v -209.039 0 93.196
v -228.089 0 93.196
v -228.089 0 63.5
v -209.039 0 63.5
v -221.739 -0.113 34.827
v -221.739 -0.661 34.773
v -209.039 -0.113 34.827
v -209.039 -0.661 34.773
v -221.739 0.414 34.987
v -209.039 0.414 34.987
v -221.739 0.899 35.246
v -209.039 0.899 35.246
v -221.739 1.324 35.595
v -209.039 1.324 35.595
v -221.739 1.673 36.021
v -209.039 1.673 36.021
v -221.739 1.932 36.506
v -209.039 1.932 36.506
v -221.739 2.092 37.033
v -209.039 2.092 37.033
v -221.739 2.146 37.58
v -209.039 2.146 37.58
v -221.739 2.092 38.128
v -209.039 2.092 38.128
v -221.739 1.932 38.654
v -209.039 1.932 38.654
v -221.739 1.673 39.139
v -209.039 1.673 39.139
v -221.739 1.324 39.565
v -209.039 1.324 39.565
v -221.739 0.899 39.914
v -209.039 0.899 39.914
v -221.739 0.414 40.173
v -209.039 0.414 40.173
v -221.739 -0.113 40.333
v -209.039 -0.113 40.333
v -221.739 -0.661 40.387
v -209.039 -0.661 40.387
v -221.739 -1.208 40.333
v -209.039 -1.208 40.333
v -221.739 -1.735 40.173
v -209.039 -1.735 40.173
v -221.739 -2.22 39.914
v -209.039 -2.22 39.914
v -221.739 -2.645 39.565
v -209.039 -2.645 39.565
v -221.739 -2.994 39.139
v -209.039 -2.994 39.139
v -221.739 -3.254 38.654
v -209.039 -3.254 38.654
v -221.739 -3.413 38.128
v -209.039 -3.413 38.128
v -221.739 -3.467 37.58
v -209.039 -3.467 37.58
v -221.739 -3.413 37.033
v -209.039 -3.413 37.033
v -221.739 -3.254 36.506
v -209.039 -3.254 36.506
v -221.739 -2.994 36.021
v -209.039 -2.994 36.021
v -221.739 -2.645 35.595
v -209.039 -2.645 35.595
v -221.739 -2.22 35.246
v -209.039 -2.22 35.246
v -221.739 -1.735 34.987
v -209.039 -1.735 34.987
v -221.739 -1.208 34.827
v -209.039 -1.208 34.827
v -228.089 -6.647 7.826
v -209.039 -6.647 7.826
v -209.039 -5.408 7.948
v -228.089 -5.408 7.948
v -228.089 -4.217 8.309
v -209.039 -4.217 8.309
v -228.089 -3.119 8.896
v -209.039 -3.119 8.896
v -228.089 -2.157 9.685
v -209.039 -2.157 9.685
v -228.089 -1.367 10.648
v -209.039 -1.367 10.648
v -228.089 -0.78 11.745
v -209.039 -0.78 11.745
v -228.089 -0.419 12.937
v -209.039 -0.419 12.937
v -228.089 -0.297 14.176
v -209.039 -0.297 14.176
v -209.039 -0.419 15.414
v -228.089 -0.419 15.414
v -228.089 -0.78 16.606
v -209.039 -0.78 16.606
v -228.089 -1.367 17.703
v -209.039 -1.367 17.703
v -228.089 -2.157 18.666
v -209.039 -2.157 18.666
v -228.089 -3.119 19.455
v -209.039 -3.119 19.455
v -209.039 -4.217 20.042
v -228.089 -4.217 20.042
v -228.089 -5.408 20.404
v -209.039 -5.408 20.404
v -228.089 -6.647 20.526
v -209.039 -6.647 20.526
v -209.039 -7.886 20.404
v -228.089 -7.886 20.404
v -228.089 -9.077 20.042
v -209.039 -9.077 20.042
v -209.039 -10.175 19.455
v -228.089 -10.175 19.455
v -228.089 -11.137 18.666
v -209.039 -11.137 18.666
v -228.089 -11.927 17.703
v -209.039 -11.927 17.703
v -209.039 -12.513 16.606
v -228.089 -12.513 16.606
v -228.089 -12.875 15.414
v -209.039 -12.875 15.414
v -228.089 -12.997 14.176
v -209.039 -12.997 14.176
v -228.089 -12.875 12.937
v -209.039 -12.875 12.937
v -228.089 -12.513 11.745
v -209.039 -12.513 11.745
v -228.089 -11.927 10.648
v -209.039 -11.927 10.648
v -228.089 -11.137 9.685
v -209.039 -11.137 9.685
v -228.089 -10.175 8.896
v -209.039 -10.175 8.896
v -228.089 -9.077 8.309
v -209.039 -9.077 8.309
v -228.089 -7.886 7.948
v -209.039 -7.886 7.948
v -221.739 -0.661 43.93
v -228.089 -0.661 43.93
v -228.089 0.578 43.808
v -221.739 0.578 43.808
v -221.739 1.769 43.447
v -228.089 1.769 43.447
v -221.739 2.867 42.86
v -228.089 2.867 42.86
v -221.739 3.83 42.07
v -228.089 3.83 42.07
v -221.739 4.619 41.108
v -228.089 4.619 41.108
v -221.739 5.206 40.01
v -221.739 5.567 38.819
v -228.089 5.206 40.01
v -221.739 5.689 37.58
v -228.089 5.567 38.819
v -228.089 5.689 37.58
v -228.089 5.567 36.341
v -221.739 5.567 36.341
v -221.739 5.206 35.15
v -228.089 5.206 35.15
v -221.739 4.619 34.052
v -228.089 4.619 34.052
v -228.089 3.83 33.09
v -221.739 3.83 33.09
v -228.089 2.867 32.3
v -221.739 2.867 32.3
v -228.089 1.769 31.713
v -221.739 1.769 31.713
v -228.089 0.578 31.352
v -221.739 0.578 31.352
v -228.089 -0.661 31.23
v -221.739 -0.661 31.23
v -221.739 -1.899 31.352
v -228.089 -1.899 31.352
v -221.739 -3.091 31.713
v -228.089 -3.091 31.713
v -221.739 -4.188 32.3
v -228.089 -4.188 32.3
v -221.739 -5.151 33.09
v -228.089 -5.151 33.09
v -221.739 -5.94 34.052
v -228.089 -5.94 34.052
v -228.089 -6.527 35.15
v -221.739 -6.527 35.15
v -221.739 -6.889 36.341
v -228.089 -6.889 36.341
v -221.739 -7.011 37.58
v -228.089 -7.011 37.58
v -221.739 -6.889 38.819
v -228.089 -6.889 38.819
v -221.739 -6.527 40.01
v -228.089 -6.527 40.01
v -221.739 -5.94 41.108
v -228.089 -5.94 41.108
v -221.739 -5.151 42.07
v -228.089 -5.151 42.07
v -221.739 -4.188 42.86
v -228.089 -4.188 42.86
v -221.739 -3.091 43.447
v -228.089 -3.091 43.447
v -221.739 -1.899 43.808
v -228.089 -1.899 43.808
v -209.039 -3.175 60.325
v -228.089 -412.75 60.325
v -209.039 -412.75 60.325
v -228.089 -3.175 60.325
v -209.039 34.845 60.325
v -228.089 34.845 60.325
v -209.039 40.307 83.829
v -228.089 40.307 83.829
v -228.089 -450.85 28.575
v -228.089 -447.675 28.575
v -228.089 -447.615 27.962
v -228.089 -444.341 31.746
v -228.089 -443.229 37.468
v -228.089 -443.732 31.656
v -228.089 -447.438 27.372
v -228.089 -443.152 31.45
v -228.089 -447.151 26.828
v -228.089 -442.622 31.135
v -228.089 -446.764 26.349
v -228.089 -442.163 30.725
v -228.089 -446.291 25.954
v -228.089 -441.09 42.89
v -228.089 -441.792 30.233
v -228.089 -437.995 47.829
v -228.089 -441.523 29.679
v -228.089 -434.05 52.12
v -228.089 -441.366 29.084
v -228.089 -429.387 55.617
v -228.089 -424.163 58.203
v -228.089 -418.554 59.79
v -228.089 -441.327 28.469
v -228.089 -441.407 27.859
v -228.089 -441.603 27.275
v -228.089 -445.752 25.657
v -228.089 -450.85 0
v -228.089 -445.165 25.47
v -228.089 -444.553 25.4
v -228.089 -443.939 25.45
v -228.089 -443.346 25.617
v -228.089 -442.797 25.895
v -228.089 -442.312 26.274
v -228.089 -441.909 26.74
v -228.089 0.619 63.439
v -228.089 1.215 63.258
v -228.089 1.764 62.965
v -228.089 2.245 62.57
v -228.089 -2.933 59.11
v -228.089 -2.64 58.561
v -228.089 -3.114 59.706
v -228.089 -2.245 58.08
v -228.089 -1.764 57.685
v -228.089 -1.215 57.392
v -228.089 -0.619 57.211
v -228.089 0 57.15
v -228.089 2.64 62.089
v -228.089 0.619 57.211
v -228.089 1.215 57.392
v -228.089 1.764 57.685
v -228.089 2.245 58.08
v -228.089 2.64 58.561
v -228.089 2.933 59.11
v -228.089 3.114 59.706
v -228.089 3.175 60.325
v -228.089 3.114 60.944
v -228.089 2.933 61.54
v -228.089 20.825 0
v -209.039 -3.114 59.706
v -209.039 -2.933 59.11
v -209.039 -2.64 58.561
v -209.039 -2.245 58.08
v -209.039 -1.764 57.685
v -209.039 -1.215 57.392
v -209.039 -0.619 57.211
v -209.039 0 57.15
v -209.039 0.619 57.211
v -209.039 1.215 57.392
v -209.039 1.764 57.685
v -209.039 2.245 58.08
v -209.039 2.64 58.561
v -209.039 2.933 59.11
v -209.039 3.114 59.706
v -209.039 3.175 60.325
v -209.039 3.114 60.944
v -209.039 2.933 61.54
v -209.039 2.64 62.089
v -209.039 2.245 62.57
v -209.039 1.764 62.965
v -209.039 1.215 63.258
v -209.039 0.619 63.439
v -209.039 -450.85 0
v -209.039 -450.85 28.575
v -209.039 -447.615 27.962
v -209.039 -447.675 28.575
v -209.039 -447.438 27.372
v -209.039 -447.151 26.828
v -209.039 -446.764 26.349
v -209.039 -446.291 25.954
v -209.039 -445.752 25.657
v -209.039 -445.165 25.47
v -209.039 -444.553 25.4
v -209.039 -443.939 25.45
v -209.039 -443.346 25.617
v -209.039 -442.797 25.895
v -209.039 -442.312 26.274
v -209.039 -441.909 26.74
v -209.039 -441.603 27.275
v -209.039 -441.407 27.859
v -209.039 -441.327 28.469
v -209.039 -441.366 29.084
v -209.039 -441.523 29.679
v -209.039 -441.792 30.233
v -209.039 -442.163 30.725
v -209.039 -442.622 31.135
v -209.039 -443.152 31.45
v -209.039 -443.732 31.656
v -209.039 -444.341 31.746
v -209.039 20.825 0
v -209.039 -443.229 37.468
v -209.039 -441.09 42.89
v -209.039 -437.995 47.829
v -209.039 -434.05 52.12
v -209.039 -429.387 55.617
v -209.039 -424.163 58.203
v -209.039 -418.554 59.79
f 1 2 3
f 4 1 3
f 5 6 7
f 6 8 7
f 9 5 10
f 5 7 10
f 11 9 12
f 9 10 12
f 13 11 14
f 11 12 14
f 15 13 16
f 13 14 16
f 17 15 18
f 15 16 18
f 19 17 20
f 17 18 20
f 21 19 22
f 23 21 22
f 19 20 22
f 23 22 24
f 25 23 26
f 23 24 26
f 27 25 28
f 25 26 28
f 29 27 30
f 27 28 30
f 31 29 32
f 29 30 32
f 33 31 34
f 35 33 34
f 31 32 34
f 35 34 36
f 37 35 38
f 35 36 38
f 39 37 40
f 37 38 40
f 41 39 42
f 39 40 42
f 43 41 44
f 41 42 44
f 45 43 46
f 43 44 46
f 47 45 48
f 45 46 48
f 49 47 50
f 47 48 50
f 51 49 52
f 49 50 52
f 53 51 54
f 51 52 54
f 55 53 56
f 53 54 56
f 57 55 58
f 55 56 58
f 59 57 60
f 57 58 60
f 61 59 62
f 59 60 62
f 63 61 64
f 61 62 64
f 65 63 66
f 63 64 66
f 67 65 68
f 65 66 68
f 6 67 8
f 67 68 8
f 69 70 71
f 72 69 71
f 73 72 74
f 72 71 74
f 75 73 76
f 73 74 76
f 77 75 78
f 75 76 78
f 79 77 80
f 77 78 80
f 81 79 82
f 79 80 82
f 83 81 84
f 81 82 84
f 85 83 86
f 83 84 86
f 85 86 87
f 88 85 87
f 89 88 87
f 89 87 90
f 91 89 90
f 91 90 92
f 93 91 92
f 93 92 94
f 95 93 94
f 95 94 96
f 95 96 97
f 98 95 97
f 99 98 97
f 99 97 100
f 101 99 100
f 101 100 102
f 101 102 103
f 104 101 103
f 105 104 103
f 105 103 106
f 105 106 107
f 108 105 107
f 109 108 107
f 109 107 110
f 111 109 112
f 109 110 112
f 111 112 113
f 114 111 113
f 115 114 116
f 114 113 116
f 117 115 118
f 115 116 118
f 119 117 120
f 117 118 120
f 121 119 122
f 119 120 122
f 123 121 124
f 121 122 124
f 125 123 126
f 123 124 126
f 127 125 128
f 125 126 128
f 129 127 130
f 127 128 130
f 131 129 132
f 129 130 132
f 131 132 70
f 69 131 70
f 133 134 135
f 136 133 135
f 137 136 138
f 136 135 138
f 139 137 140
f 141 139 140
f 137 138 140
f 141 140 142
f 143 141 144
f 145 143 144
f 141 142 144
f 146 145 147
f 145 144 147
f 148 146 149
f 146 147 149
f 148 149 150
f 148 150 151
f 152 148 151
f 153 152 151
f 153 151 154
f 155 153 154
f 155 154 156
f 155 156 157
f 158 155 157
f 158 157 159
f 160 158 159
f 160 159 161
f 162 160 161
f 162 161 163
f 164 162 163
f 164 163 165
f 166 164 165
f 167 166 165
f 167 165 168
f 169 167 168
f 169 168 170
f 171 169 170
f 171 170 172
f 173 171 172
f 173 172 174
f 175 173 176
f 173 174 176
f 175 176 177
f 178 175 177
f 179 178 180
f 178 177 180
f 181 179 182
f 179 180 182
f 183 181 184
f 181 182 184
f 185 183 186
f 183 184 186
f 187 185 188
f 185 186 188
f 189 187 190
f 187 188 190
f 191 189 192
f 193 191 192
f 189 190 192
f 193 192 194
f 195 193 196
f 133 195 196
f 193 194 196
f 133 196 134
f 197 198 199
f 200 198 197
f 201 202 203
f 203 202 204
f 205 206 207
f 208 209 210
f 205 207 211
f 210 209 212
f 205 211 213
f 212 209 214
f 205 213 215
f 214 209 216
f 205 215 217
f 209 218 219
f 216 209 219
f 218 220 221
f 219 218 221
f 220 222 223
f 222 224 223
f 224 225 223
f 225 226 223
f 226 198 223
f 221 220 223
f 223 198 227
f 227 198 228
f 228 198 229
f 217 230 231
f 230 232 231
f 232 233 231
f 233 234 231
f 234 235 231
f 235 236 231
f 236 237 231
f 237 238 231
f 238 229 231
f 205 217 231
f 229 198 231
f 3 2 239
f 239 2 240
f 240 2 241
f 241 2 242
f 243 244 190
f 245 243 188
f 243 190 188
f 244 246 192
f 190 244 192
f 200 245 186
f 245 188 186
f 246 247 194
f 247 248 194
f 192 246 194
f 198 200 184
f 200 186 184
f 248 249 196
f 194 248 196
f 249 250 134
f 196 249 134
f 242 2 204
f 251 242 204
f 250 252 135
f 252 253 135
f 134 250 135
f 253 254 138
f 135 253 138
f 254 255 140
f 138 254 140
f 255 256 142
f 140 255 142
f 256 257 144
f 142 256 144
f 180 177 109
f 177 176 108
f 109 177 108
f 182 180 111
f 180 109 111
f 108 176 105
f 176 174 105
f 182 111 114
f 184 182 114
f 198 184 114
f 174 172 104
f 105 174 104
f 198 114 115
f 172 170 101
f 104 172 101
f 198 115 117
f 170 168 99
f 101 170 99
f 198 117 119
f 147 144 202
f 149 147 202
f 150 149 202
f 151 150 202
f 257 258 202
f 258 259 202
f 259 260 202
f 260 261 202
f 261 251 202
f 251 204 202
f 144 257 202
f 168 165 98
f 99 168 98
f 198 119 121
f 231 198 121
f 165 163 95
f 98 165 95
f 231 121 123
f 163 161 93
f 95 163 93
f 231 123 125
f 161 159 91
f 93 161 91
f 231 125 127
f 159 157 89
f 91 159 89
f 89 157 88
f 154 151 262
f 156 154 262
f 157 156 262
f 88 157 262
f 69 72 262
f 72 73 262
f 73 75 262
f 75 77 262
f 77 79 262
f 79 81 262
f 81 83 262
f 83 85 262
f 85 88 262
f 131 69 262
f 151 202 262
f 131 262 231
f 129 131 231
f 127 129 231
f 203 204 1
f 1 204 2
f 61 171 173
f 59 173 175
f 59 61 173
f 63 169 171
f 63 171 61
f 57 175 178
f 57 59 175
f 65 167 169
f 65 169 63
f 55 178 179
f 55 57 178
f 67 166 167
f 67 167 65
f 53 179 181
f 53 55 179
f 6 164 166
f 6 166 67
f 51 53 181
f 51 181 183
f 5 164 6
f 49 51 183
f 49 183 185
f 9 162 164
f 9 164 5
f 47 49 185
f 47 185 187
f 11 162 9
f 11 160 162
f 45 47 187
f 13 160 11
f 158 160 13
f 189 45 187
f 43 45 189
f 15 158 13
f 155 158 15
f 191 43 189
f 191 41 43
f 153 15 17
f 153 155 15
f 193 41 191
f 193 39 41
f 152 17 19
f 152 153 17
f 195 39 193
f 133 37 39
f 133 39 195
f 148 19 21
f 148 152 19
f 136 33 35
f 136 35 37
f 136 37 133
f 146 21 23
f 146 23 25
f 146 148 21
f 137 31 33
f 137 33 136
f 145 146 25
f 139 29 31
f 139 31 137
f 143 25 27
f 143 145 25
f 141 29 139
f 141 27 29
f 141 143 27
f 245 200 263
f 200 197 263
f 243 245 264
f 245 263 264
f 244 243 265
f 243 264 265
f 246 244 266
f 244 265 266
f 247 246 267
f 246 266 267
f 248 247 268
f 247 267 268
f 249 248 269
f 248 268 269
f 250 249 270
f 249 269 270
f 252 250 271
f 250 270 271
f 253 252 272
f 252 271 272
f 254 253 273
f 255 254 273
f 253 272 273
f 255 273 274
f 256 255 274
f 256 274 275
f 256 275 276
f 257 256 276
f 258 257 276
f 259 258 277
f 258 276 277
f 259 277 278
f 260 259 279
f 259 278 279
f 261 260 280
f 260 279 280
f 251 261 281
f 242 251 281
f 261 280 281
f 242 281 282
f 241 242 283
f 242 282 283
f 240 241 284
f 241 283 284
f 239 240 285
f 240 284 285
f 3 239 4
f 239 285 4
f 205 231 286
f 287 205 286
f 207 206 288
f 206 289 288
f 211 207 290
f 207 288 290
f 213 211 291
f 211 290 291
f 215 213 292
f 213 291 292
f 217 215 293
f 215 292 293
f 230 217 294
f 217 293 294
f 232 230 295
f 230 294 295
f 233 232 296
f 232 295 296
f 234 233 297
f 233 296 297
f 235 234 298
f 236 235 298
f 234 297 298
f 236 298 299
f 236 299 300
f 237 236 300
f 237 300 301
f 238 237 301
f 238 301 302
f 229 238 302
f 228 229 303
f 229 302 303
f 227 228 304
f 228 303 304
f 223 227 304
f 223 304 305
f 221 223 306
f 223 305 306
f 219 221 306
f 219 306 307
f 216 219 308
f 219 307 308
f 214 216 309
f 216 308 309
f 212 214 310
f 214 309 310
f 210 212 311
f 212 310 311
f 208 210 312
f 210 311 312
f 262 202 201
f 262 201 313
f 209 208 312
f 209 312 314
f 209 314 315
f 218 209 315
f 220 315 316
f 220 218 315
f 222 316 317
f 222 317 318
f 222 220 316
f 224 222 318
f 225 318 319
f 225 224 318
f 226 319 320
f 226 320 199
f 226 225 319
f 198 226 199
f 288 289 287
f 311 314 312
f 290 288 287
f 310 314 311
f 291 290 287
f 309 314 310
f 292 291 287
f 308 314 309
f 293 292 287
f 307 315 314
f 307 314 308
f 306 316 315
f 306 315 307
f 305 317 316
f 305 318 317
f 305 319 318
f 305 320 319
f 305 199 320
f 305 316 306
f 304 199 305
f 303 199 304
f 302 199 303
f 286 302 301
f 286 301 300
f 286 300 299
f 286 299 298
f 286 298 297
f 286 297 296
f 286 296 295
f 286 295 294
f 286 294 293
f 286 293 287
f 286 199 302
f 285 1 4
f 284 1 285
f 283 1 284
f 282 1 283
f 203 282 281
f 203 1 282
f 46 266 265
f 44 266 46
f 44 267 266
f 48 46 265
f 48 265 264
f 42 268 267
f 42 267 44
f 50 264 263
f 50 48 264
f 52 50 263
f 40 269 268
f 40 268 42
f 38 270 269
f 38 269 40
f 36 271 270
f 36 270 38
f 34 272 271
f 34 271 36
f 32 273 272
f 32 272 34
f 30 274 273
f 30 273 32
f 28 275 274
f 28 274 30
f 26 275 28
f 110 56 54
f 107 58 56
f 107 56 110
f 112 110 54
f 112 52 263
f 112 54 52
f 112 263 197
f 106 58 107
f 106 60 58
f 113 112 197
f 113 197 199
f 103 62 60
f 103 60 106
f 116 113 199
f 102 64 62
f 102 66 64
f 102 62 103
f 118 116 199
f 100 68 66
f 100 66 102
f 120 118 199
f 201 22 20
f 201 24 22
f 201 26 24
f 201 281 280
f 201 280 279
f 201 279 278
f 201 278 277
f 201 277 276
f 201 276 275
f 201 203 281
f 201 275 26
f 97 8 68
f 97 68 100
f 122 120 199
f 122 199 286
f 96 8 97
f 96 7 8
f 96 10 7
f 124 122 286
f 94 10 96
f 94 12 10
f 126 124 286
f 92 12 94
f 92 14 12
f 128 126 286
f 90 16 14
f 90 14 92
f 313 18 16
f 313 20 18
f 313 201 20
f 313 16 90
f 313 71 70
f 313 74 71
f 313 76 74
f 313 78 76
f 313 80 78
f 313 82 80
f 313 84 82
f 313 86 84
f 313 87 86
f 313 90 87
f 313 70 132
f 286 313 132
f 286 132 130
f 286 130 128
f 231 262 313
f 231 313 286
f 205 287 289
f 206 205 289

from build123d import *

# Parameters (mm, degrees)
SKETCH1_W                                        = 19.05
SKETCH1_H                                        = 450.85
BOSS_EXTRUDE1_DEPTH                              = 66.675
FILLET4_R                                        = 38.1
CUT_EXTRUDE1_REACH                               = 458.151
BOSS_EXTRUDE2_DEPTH                              = 19.05
BOSS_EXTRUDE3_DEPTH                              = 19.05
F_1_4_0_25_DIAMETER_HOLE1_D                      = 6.35
F_10_CLEARANCE_HOLE_WITH_1_0_X_25_CB_D           = 5.6134
F_10_CLEARANCE_HOLE_WITH_1_0_X_25_CB_CBORE_D     = 12.7
F_10_CLEARANCE_HOLE_WITH_1_0_X_25_CB_CBORE_DEPTH = 6.35
F_1_2_0_5_DIAMETER_SLOT1_D                       = 12.7


with BuildPart() as part:
    # Sketch1 → Boss-Extrude1 (new body)
    with BuildSketch(Plane.XY):
        with Locations((-218.563766336, -225.425)):
            Rectangle(SKETCH1_W, SKETCH1_H)
    extrude(amount=BOSS_EXTRUDE1_DEPTH)

    # Fillet4
    fillet4_edges = [part.edges().sort_by_distance(p)[0] for p in [
        (-218.563766336, -450.85, 66.675),
    ]]
    fillet(fillet4_edges, radius=FILLET4_R)

    # Sketch4 → Cut-Extrude1 (cut, up to next)
    with BuildSketch(Plane.ZY.offset(228.088766336), mode=Mode.PRIVATE) as cut_extrude1_sk1:
        with BuildLine():
            Line((66.675, 0), (66.675, -412.75))
            ThreePointArc((66.675, -412.75), (55.515768363, -439.690768363), (28.575, -450.85))
            Line((28.575, -450.85), (28.575, -444.5))
            ThreePointArc((28.575, -444.5), (51.025640303, -435.200640303), (60.325, -412.75))
            Line((60.325, -412.75), (60.325, 0))
            Line((60.325, 0), (66.675, 0))
        make_face()
    cut_extrude1_tool1 = extrude(cut_extrude1_sk1.sketch, amount=-CUT_EXTRUDE1_REACH, mode=Mode.PRIVATE) & part.part
    add(cut_extrude1_tool1.solids().sort_by_distance((-228.088766, -233.202612, 62.01827))[0], mode=Mode.SUBTRACT)

    # Sketch7 → Boss-Extrude2 (add, through all)
    with BuildSketch(Plane.ZY.offset(228.088766336)):
        Polygon((0, 0), (60.325, 0), (60.325, 34.844553242), (0, 20.824633003), align=None)
    extrude(amount=-BOSS_EXTRUDE2_DEPTH)

    # Sketch8 → Boss-Extrude3 (add, through all)
    with BuildSketch(Plane.ZY.offset(228.088766336)):
        Polygon((60.325, 34.844553242), (83.828599938, 40.306941911), (93.196193981, 0), (60.325, 0), align=None)
    extrude(amount=-BOSS_EXTRUDE3_DEPTH)

    # 1/4 (0.25) Diameter Hole1 (through all)
    with Locations(Plane.ZY.offset(228.088766336)):
        with Locations((28.575, -444.5), (60.325, 0)):
            Hole(F_1_4_0_25_DIAMETER_HOLE1_D / 2)

    # #10 Clearance Hole with 1.0 x .25 CB (through all)
    with Locations(Plane.ZY.offset(228.088766336)):
        with Locations((37.58012522, -0.660555349)):
            CounterBoreHole(F_10_CLEARANCE_HOLE_WITH_1_0_X_25_CB_D / 2, F_10_CLEARANCE_HOLE_WITH_1_0_X_25_CB_CBORE_D / 2, F_10_CLEARANCE_HOLE_WITH_1_0_X_25_CB_CBORE_DEPTH)

    # 1/2 (0.5) Diameter Slot1 (through all)
    with Locations(Plane.ZY.offset(228.088766336)):
        with Locations((14.175520603, -6.646762989)):
            Hole(F_1_2_0_5_DIAMETER_SLOT1_D / 2)


solid = part.part
